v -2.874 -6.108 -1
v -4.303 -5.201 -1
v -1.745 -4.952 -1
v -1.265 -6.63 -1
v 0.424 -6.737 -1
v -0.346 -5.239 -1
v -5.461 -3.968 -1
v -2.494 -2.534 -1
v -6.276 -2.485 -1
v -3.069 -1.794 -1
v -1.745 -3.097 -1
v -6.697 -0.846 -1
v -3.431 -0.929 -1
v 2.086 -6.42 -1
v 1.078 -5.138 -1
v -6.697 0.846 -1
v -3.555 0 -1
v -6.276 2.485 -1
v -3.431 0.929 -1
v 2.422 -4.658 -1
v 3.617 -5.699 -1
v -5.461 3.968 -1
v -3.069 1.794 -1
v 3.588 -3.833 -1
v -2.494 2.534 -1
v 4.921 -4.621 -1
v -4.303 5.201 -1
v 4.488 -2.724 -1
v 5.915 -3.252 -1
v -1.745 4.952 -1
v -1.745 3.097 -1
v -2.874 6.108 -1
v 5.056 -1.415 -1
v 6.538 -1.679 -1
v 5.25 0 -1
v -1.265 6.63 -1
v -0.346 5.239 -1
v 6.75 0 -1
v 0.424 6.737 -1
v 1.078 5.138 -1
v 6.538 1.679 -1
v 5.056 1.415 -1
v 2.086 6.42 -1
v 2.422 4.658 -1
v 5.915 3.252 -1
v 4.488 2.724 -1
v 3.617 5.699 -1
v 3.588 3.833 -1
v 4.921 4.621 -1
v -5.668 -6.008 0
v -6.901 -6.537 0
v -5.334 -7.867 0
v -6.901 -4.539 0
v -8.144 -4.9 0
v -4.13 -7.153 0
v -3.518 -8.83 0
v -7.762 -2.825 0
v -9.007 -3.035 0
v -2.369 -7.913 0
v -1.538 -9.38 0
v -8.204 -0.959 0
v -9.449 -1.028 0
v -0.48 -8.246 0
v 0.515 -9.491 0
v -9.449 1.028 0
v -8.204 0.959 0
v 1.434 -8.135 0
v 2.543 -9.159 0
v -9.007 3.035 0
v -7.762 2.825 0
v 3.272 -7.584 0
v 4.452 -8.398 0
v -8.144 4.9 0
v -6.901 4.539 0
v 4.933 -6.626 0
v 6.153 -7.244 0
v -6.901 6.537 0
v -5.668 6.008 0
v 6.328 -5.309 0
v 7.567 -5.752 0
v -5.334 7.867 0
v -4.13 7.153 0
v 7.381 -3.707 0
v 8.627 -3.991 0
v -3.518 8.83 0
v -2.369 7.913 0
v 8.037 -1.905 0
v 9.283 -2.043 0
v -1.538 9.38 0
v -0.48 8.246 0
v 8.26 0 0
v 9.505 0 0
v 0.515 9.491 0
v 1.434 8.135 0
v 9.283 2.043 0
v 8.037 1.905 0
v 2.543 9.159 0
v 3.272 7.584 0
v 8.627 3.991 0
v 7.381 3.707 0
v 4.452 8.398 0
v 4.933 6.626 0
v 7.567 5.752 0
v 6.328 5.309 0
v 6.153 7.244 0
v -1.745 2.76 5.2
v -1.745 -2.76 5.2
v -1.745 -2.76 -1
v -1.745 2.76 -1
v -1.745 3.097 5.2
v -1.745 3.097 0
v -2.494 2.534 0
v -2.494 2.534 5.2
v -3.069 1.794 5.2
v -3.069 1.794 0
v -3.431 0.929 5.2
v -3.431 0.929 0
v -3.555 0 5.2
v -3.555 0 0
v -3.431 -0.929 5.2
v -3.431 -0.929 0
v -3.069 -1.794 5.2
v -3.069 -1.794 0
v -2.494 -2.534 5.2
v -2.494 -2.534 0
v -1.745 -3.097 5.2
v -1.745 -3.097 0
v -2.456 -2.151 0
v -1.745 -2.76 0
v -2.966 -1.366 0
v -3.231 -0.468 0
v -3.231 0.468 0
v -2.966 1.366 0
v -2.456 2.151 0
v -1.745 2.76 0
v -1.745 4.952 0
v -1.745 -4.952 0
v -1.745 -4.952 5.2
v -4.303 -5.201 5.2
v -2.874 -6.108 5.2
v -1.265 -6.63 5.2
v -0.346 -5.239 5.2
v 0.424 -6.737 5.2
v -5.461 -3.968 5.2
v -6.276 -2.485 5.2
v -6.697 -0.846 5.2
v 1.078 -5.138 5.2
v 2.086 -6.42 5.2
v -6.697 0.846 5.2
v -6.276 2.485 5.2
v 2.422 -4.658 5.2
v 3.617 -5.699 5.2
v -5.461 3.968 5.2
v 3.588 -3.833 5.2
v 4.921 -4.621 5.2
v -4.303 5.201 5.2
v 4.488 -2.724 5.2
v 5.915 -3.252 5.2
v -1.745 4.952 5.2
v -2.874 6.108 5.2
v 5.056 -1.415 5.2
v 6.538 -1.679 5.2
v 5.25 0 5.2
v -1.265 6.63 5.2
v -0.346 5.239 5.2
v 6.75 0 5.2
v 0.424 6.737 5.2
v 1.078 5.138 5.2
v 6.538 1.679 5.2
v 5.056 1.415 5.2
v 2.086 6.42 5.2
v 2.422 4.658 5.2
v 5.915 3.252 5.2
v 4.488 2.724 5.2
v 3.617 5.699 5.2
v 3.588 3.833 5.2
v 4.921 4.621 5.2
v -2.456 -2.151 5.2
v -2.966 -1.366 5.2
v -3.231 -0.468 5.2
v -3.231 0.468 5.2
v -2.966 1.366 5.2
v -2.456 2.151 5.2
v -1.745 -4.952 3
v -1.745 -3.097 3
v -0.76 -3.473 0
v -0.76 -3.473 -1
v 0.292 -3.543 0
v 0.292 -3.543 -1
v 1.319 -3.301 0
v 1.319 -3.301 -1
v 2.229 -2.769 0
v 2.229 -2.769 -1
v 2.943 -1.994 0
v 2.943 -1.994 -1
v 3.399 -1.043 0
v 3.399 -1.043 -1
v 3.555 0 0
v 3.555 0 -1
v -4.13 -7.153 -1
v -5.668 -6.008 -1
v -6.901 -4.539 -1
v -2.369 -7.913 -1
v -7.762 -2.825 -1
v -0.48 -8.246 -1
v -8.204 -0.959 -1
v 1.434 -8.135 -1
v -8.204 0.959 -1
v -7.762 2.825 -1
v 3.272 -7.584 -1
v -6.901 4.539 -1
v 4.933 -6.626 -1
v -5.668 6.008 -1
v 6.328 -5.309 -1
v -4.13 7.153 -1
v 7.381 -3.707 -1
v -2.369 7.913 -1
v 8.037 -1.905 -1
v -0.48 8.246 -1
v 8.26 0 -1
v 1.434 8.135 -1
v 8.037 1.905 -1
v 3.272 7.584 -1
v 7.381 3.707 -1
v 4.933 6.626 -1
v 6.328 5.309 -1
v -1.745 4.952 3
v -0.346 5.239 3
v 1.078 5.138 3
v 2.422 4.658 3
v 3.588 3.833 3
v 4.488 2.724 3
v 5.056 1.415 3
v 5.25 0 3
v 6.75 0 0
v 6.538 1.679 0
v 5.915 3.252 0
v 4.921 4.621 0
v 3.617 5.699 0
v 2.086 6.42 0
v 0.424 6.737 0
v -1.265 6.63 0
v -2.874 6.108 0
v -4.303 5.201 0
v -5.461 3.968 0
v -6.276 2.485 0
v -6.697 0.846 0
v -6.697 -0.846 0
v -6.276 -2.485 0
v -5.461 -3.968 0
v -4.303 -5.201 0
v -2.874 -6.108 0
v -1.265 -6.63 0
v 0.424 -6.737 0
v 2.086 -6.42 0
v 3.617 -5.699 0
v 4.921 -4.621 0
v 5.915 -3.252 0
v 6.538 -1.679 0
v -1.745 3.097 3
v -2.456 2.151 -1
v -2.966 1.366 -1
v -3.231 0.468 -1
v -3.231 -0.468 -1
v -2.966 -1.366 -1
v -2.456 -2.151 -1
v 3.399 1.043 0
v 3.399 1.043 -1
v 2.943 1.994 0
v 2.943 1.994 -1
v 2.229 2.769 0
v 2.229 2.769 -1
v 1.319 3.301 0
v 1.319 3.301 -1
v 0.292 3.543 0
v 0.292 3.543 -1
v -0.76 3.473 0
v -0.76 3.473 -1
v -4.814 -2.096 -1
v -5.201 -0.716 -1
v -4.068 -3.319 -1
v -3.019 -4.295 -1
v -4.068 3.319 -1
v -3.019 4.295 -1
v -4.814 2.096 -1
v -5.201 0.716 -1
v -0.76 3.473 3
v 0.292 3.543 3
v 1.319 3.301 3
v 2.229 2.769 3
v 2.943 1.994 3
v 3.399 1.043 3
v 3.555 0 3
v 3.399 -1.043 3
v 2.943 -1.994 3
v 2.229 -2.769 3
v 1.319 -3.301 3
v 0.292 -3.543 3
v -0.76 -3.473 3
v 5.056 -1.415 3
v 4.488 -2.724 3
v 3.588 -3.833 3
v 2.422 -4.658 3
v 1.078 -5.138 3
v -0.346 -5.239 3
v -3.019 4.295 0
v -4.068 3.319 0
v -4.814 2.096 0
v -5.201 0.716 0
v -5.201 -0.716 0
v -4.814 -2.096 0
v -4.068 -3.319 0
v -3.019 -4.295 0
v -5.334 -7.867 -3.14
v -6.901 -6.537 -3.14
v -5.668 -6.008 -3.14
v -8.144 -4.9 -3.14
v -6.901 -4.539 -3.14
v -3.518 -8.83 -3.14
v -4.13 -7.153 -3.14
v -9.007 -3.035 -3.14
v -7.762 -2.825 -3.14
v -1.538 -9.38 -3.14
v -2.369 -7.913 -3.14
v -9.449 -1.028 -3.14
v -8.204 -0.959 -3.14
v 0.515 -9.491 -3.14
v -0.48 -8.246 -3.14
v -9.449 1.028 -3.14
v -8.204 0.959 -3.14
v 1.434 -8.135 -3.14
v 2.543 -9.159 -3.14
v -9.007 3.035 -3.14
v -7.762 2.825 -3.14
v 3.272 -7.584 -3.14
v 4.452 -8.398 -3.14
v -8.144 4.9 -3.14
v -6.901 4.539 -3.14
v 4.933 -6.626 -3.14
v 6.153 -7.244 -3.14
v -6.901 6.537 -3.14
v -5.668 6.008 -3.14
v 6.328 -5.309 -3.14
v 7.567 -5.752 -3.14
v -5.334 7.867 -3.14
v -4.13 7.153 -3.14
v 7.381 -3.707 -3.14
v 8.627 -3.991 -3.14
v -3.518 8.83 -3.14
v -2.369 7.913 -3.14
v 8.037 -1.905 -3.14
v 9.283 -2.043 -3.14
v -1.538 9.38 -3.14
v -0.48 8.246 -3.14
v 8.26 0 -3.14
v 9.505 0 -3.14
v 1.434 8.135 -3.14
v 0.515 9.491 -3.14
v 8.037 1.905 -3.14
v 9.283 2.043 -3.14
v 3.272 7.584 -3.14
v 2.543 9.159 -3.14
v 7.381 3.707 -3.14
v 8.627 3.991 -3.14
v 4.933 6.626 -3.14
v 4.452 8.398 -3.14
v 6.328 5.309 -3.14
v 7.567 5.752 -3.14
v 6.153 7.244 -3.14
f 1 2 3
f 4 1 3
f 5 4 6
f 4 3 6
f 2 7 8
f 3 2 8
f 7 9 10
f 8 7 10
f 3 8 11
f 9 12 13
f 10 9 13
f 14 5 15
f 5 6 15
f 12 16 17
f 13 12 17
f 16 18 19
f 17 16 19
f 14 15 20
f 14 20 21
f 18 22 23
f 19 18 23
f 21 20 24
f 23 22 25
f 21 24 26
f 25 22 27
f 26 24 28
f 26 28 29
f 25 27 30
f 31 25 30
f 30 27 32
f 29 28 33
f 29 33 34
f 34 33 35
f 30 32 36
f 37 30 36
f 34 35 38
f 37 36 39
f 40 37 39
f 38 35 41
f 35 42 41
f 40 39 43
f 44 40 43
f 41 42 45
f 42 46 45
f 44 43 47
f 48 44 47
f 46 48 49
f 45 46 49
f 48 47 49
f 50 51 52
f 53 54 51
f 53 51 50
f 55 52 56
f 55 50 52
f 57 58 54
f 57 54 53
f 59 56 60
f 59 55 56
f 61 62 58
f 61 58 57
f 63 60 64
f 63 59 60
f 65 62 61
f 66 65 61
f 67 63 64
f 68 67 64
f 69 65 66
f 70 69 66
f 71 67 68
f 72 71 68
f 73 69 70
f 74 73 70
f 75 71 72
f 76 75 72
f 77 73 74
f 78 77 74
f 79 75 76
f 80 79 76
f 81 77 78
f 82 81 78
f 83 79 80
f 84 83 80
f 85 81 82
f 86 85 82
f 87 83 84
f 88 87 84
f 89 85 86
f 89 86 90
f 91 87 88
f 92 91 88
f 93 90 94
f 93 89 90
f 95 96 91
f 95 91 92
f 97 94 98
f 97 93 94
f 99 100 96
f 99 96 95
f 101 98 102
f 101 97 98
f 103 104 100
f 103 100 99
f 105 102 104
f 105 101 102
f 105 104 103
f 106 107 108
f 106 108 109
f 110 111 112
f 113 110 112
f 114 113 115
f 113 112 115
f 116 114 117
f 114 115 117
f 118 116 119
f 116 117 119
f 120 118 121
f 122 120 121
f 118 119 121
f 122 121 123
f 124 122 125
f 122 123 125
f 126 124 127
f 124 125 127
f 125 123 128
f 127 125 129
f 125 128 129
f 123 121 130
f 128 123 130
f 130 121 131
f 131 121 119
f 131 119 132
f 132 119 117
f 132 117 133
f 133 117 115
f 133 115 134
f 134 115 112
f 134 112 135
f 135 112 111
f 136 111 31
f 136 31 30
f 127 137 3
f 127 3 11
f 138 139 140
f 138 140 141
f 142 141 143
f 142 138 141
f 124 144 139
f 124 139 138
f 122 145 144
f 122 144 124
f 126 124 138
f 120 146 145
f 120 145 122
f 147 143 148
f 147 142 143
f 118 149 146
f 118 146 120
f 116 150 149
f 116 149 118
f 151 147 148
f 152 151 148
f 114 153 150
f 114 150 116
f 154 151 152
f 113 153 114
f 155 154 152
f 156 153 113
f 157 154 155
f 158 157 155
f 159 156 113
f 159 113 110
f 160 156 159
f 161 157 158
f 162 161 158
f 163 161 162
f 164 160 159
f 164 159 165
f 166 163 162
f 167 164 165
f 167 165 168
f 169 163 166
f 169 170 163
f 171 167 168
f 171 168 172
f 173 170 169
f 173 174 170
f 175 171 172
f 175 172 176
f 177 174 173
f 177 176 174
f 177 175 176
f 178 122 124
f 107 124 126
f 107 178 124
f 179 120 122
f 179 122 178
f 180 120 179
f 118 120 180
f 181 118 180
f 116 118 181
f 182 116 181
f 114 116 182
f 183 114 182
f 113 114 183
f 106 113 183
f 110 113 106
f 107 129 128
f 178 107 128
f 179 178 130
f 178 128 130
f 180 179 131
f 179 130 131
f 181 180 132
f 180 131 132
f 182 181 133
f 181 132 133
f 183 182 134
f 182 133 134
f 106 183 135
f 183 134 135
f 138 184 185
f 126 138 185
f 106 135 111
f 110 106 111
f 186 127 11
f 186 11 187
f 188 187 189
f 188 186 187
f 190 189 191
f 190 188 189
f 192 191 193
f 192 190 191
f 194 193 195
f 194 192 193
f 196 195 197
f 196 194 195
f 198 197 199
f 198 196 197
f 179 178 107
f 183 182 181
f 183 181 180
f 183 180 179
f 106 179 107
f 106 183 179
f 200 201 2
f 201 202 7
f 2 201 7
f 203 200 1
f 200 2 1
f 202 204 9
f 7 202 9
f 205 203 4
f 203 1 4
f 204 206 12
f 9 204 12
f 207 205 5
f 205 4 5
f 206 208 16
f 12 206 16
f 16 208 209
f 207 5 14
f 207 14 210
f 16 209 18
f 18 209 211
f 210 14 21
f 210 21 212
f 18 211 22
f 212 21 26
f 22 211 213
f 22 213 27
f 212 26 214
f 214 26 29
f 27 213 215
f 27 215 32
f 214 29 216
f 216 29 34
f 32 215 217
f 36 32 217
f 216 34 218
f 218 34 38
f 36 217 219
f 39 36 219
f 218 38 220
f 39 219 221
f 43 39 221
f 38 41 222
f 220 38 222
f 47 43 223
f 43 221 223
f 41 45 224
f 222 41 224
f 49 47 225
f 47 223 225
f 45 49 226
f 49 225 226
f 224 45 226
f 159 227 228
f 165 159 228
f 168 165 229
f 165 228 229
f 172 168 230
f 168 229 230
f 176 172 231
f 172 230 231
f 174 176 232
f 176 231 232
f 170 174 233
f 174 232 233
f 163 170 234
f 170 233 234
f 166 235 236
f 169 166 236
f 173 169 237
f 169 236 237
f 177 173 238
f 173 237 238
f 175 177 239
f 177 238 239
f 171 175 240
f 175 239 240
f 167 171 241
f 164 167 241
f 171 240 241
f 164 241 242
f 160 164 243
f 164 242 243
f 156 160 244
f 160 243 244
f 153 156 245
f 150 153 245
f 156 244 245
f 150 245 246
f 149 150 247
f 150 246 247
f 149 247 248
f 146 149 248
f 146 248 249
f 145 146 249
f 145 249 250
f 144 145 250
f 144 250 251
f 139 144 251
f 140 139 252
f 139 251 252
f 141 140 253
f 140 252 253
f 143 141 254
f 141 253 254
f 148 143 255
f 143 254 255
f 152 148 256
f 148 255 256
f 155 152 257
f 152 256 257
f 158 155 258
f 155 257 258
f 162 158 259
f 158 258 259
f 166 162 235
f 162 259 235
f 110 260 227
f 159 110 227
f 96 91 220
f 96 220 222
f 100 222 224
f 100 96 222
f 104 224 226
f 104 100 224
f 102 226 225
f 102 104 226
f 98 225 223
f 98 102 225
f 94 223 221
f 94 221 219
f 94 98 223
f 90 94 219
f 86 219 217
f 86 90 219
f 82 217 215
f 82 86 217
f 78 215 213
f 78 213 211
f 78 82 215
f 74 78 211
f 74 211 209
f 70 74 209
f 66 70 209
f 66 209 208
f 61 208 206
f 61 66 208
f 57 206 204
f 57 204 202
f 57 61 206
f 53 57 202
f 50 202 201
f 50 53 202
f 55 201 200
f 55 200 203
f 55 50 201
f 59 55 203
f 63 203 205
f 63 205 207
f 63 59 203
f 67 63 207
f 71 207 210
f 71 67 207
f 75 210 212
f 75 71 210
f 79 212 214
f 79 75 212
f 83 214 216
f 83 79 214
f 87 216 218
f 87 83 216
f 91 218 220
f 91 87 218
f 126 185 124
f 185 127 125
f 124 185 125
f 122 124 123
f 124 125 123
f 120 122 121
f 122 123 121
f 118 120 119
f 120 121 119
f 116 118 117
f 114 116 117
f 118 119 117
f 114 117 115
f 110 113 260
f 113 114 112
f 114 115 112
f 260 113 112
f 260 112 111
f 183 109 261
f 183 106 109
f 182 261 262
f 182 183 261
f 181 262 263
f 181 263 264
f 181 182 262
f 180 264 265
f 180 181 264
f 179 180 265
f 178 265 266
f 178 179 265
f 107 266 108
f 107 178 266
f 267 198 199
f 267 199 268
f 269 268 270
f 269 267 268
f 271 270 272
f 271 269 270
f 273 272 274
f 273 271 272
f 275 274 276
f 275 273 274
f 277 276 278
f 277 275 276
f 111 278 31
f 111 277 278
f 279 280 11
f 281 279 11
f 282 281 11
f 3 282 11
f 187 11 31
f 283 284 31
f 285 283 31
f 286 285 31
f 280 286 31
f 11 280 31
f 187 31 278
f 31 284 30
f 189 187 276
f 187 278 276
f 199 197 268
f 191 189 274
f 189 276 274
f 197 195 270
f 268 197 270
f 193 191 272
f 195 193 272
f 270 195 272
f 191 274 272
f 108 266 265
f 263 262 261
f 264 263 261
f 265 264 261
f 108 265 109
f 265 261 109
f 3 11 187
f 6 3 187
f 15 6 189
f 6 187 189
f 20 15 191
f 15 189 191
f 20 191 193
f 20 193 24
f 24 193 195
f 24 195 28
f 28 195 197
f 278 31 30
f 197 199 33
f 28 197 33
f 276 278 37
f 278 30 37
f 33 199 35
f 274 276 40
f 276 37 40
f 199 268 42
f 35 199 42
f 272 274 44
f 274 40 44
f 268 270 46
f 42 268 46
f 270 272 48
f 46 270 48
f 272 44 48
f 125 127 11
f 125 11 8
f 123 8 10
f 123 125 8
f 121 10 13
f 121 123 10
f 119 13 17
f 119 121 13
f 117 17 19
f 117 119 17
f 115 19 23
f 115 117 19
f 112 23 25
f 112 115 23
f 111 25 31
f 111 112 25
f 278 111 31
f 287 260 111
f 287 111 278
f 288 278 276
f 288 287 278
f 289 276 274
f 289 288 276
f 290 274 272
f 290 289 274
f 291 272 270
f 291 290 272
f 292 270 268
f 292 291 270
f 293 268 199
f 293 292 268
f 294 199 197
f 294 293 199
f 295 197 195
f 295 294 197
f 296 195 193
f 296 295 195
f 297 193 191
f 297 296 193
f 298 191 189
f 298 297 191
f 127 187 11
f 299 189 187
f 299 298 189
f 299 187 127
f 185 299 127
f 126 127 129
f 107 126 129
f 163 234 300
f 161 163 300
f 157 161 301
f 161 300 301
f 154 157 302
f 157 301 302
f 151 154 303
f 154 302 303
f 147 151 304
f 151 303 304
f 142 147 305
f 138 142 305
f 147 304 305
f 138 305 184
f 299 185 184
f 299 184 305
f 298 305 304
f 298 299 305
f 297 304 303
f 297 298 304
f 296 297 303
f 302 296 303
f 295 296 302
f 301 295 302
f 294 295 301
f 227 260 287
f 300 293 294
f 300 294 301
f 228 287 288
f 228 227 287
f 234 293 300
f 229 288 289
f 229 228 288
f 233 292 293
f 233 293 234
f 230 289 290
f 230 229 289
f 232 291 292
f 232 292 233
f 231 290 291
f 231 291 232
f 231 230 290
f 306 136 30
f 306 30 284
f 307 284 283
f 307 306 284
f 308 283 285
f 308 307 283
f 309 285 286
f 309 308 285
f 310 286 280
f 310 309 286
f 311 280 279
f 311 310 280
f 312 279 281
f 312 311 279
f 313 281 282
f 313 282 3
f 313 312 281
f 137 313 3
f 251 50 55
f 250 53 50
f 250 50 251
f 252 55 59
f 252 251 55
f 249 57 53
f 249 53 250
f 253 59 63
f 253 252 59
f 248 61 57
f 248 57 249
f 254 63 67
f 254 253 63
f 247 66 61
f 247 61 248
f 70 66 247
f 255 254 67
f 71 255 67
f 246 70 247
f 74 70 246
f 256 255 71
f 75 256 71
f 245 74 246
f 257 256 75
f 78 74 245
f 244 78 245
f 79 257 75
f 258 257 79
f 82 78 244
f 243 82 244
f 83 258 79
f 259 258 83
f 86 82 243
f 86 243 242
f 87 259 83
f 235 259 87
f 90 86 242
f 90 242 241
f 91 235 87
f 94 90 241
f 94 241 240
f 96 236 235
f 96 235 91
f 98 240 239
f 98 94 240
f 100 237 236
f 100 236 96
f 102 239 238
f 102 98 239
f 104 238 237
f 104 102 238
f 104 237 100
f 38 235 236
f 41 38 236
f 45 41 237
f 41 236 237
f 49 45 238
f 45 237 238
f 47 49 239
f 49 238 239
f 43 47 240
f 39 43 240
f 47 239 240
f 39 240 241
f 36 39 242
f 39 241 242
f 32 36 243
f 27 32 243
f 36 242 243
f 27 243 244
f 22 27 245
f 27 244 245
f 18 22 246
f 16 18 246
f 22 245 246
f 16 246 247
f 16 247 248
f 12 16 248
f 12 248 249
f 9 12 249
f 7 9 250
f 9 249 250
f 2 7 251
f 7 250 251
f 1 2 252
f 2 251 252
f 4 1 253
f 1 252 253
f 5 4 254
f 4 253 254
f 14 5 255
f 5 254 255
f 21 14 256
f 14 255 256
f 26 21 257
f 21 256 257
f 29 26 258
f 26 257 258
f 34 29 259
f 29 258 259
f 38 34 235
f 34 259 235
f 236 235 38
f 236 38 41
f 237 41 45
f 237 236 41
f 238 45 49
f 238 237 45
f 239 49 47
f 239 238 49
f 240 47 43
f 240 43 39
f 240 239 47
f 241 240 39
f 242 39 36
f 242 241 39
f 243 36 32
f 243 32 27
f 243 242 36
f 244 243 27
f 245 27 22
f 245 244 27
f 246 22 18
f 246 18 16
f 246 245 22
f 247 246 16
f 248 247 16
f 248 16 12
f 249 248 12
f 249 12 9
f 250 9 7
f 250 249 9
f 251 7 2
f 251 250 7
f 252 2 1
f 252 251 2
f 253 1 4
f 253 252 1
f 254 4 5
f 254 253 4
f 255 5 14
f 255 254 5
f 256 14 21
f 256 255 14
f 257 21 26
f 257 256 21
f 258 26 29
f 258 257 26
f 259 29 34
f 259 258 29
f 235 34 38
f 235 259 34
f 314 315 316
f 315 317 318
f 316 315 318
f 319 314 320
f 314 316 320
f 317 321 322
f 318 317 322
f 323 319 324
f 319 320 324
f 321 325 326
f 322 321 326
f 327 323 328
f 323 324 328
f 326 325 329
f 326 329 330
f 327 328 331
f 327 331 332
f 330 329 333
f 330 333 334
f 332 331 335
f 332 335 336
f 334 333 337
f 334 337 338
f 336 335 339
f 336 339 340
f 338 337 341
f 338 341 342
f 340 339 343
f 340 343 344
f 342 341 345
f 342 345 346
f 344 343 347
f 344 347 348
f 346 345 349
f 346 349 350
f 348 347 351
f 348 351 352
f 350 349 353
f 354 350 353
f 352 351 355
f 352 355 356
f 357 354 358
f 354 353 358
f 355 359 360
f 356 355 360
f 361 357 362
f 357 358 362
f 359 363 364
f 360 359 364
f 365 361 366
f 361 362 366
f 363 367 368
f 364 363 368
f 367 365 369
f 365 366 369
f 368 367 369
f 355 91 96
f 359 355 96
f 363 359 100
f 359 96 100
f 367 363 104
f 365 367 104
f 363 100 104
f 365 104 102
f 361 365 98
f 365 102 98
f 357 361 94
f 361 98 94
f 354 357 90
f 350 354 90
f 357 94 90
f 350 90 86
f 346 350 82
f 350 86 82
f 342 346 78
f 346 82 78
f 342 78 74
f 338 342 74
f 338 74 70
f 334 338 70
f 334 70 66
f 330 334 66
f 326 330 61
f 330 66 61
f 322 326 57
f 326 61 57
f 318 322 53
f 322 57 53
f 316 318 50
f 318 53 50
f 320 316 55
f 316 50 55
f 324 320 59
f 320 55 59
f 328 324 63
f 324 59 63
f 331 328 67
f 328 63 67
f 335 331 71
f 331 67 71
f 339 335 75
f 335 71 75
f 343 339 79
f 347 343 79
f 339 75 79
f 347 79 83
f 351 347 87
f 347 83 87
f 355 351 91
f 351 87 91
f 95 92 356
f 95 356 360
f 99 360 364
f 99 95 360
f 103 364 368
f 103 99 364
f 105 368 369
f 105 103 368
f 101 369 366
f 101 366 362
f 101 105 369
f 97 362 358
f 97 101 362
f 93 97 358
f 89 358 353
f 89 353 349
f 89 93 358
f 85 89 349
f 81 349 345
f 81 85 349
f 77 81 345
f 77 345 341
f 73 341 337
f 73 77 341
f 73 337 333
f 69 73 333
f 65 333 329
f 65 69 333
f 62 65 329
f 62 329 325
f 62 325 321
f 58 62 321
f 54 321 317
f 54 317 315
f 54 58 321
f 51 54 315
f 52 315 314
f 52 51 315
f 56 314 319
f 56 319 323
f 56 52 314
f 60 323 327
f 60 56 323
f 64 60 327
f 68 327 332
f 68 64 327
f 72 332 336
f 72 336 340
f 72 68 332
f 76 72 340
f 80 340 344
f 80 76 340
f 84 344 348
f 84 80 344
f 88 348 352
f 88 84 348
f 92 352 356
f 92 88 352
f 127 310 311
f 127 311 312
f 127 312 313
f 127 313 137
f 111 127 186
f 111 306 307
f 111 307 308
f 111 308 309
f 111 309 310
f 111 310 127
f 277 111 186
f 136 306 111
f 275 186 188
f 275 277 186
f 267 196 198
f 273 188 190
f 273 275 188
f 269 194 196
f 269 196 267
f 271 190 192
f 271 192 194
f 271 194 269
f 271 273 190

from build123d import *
from build123d import SkipClean  # not in build123d's __all__

# Parameters (mm, degrees)
F1_DEPTH      = 3
F1_DEPTH_BACK = 1
F0_R          = 6.75
F2_DEPTH      = 5.2
F2_DEPTH_BACK = 1
F0_R_2        = 8.26
F3_DEPTH      = 1
F0_R_3        = 9.505
F4_DEPTH      = 3.14
F5_DEPTH      = 5.2
F6_DEPTH      = 5.2
F6_DEPTH_BACK = 1


with BuildPart() as f1:
    # F0 (on Top) → F1 (new body, two sides)
    with BuildSketch(Plane.XY) as f1_sk:
        with BuildLine():
            ThreePointArc((-1.745, 3.0972568508), (1.7936763922, 3.0693240298), (3.555, 0))
            ThreePointArc((3.555, 0), (1.7936763922, -3.0693240298), (-1.745, -3.0972568508))
            Line((-1.745, -3.0972568508), (-1.745, -4.9515123952))
            ThreePointArc((-1.745, -4.9515123952), (3.0332532041, -4.2850758453), (5.25, 0))
            ThreePointArc((5.25, 0), (3.0332532041, 4.2850758453), (-1.745, 4.9515123952))
            Line((-1.745, 4.9515123952), (-1.745, 3.0972568508))
        make_face()
    extrude(amount=F1_DEPTH)
    extrude(f1_sk.sketch, amount=-F1_DEPTH_BACK)

    # F0 (on Top) → F2 (join, two sides)
    with BuildSketch(Plane.XY) as f2_sk:
        Circle(F0_R)
        with BuildLine():
            ThreePointArc((-1.745, -4.9515123952), (-5.25, 0), (-1.745, 4.9515123952))
            ThreePointArc((-1.745, 4.9515123952), (3.0332532041, 4.2850758453), (5.25, 0))
            ThreePointArc((5.25, 0), (3.0332532041, -4.2850758453), (-1.745, -4.9515123952))
        make_face(mode=Mode.SUBTRACT)
        with BuildLine():
            ThreePointArc((-1.745, -3.0972568508), (-3.555, 0), (-1.745, 3.0972568508))
            Line((-1.745, 3.0972568508), (-1.745, 4.9515123952))
            ThreePointArc((-1.745, 4.9515123952), (-5.25, 0), (-1.745, -4.9515123952))
            Line((-1.745, -4.9515123952), (-1.745, -3.0972568508))
        make_face()
    with SkipClean():  # cleaning this boolean's faces spoils the solid; the shape is the same uncleaned
        extrude(amount=F2_DEPTH)
        extrude(f2_sk.sketch, amount=-F2_DEPTH_BACK)


with BuildPart() as f3:
    # F0 (on Top) → F3 (new body)
    with BuildSketch(Plane.XY):
        Circle(F0_R_2)
        Circle(F0_R, mode=Mode.SUBTRACT)
    extrude(amount=-F3_DEPTH)


with BuildPart() as f3b:
    # F0 (on Top) → F3, piece 2 (new body)
    with BuildSketch(Plane.XY):
        with BuildLine():
            Line((-1.745, 0), (2.48, 0))
            ThreePointArc((2.48, 0), (0.9546727188, 2.288886192), (-1.745, 1.7622074225))
            Line((-1.745, 1.7622074225), (-1.745, 0))
        make_face()
        with BuildLine():
            Line((3.265, 0), (3.555, 0))
            ThreePointArc((3.555, 0), (1.7936763922, 3.0693240298), (-1.745, 3.0972568508))
            Line((-1.745, 3.0972568508), (-1.745, 2.7595651831))
            ThreePointArc((-1.745, 2.7595651831), (1.5752460125, 2.8598645073), (3.265, 0))
        make_face()
        with BuildLine():
            ThreePointArc((-1.745, -1.7622074225), (0.9546727188, -2.288886192), (2.48, 0))
            Line((2.48, 0), (-1.745, 0))
            Line((-1.745, 0), (-1.745, -1.7622074225))
        make_face()
        with BuildLine():
            ThreePointArc((-1.745, -2.7595651831), (1.5752460125, -2.8598645073), (3.265, 0))
            Line((3.265, 0), (2.48, 0))
            ThreePointArc((2.48, 0), (0.9546727188, -2.288886192), (-1.745, -1.7622074225))
            Line((-1.745, -1.7622074225), (-1.745, -2.7595651831))
        make_face()
        with BuildLine():
            Line((-1.745, 0), (-1.745, 1.7622074225))
            ThreePointArc((-1.745, 1.7622074225), (-2.48, 0), (-1.745, -1.7622074225))
            Line((-1.745, -1.7622074225), (-1.745, 0))
        make_face()
        with BuildLine():
            Line((-1.745, 1.7622074225), (-1.745, 2.7595651831))
            ThreePointArc((-1.745, 2.7595651831), (-3.265, 0), (-1.745, -2.7595651831))
            Line((-1.745, -2.7595651831), (-1.745, -1.7622074225))
            ThreePointArc((-1.745, -1.7622074225), (-2.48, 0), (-1.745, 1.7622074225))
        make_face()
        with BuildLine():
            ThreePointArc((-1.745, -3.0972568508), (1.7936763922, -3.0693240298), (3.555, 0))
            Line((3.555, 0), (3.265, 0))
            ThreePointArc((3.265, 0), (1.5752460125, -2.8598645073), (-1.745, -2.7595651831))
            Line((-1.745, -2.7595651831), (-1.745, -3.0972568508))
        make_face()
        with BuildLine():
            Line((2.48, 0), (3.265, 0))
            ThreePointArc((3.265, 0), (1.5752460125, 2.8598645073), (-1.745, 2.7595651831))
            Line((-1.745, 2.7595651831), (-1.745, 1.7622074225))
            ThreePointArc((-1.745, 1.7622074225), (0.9546727188, 2.288886192), (2.48, 0))
        make_face()
        with BuildLine():
            ThreePointArc((-1.745, -3.0972568508), (-3.555, 0), (-1.745, 3.0972568508))
            Line((-1.745, 3.0972568508), (-1.745, 4.9515123952))
            ThreePointArc((-1.745, 4.9515123952), (-5.25, 0), (-1.745, -4.9515123952))
            Line((-1.745, -4.9515123952), (-1.745, -3.0972568508))
        make_face()
        with BuildLine():
            Line((-1.745, 2.7595651831), (-1.745, 3.0972568508))
            ThreePointArc((-1.745, 3.0972568508), (-3.555, 0), (-1.745, -3.0972568508))
            Line((-1.745, -3.0972568508), (-1.745, -2.7595651831))
            ThreePointArc((-1.745, -2.7595651831), (-3.265, 0), (-1.745, 2.7595651831))
        make_face()
    extrude(amount=-F3_DEPTH)


with BuildPart() as f4:
    # F0 (on Top) → F4 (new body)
    with BuildSketch(Plane.XY):
        Circle(F0_R_3)
        Circle(F0_R_2, mode=Mode.SUBTRACT)
    extrude(amount=-F4_DEPTH)


with BuildPart() as f5:
    # F0 (on Top) → F5 (new body)
    with BuildSketch(Plane.XY):
        with BuildLine():
            Line((-1.745, 2.7595651831), (-1.745, 3.0972568508))
            ThreePointArc((-1.745, 3.0972568508), (-3.555, 0), (-1.745, -3.0972568508))
            Line((-1.745, -3.0972568508), (-1.745, -2.7595651831))
            ThreePointArc((-1.745, -2.7595651831), (-3.265, 0), (-1.745, 2.7595651831))
        make_face()
    extrude(amount=F5_DEPTH)


with BuildPart() as f6:
    # F0 (on Top) → F6 (new body, two sides)
    with BuildSketch(Plane.XY) as f6_sk:
        with BuildLine():
            Line((-1.745, 1.7622074225), (-1.745, 2.7595651831))
            ThreePointArc((-1.745, 2.7595651831), (-3.265, 0), (-1.745, -2.7595651831))
            Line((-1.745, -2.7595651831), (-1.745, -1.7622074225))
            ThreePointArc((-1.745, -1.7622074225), (-2.48, 0), (-1.745, 1.7622074225))
        make_face()
        with BuildLine():
            Line((-1.745, 0), (-1.745, 1.7622074225))
            ThreePointArc((-1.745, 1.7622074225), (-2.48, 0), (-1.745, -1.7622074225))
            Line((-1.745, -1.7622074225), (-1.745, 0))
        make_face()
    extrude(amount=F6_DEPTH)
    extrude(f6_sk.sketch, amount=-F6_DEPTH_BACK)


solid = Compound([f1.part, f3.part, f3b.part, f4.part, f5.part, f6.part])
